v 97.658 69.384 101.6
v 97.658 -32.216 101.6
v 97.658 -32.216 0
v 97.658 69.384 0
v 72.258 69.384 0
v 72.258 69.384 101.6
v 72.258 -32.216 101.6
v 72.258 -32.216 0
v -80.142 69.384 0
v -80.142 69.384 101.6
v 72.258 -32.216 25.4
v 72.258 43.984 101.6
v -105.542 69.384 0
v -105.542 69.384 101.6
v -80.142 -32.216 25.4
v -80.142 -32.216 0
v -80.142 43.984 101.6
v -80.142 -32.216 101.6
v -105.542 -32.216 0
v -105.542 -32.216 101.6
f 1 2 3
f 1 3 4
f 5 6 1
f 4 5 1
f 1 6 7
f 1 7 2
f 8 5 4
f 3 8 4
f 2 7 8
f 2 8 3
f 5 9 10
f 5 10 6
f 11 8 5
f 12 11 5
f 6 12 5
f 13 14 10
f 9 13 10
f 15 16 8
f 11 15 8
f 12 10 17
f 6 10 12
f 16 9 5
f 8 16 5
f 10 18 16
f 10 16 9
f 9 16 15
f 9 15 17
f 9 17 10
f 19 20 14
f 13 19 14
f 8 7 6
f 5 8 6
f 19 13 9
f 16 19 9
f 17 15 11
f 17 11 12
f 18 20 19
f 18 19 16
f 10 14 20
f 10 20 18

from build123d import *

# Parameters (mm, degrees)
F0_W     = 152.4
F0_H     = 101.6
F1_DEPTH = 101.6
F3_DEPTH = 152.401
F4_W     = 25.4
F4_H     = 101.6
F5_DEPTH = 101.6


with BuildPart() as f1:
    # F0 (on Top) → F1 (new body)
    with BuildSketch(Plane.XY):
        with Locations((-3.942049, 18.584252)):
            Rectangle(F0_W, F0_H)
    extrude(amount=F1_DEPTH)

    # F2 (on face) → F3 (cut, through all)
    with BuildSketch(Plane.YZ.offset(72.257951)):
        Polygon((-32.215748, 101.6), (-32.215748, 25.4), (43.984252, 101.6), align=None)
    extrude(amount=-F3_DEPTH, mode=Mode.SUBTRACT)


with BuildPart() as f5:
    # F4 (on face) → F5 (new body)
    with BuildSketch(Plane.XY.offset(101.6)):
        with Locations((-92.842049, 18.584252)):
            Rectangle(F4_W, F4_H)
        with Locations((84.957951, 18.584252)):
            Rectangle(F4_W, F4_H)
    extrude(amount=-F5_DEPTH)


solid = Compound([f1.part, f5.part])
